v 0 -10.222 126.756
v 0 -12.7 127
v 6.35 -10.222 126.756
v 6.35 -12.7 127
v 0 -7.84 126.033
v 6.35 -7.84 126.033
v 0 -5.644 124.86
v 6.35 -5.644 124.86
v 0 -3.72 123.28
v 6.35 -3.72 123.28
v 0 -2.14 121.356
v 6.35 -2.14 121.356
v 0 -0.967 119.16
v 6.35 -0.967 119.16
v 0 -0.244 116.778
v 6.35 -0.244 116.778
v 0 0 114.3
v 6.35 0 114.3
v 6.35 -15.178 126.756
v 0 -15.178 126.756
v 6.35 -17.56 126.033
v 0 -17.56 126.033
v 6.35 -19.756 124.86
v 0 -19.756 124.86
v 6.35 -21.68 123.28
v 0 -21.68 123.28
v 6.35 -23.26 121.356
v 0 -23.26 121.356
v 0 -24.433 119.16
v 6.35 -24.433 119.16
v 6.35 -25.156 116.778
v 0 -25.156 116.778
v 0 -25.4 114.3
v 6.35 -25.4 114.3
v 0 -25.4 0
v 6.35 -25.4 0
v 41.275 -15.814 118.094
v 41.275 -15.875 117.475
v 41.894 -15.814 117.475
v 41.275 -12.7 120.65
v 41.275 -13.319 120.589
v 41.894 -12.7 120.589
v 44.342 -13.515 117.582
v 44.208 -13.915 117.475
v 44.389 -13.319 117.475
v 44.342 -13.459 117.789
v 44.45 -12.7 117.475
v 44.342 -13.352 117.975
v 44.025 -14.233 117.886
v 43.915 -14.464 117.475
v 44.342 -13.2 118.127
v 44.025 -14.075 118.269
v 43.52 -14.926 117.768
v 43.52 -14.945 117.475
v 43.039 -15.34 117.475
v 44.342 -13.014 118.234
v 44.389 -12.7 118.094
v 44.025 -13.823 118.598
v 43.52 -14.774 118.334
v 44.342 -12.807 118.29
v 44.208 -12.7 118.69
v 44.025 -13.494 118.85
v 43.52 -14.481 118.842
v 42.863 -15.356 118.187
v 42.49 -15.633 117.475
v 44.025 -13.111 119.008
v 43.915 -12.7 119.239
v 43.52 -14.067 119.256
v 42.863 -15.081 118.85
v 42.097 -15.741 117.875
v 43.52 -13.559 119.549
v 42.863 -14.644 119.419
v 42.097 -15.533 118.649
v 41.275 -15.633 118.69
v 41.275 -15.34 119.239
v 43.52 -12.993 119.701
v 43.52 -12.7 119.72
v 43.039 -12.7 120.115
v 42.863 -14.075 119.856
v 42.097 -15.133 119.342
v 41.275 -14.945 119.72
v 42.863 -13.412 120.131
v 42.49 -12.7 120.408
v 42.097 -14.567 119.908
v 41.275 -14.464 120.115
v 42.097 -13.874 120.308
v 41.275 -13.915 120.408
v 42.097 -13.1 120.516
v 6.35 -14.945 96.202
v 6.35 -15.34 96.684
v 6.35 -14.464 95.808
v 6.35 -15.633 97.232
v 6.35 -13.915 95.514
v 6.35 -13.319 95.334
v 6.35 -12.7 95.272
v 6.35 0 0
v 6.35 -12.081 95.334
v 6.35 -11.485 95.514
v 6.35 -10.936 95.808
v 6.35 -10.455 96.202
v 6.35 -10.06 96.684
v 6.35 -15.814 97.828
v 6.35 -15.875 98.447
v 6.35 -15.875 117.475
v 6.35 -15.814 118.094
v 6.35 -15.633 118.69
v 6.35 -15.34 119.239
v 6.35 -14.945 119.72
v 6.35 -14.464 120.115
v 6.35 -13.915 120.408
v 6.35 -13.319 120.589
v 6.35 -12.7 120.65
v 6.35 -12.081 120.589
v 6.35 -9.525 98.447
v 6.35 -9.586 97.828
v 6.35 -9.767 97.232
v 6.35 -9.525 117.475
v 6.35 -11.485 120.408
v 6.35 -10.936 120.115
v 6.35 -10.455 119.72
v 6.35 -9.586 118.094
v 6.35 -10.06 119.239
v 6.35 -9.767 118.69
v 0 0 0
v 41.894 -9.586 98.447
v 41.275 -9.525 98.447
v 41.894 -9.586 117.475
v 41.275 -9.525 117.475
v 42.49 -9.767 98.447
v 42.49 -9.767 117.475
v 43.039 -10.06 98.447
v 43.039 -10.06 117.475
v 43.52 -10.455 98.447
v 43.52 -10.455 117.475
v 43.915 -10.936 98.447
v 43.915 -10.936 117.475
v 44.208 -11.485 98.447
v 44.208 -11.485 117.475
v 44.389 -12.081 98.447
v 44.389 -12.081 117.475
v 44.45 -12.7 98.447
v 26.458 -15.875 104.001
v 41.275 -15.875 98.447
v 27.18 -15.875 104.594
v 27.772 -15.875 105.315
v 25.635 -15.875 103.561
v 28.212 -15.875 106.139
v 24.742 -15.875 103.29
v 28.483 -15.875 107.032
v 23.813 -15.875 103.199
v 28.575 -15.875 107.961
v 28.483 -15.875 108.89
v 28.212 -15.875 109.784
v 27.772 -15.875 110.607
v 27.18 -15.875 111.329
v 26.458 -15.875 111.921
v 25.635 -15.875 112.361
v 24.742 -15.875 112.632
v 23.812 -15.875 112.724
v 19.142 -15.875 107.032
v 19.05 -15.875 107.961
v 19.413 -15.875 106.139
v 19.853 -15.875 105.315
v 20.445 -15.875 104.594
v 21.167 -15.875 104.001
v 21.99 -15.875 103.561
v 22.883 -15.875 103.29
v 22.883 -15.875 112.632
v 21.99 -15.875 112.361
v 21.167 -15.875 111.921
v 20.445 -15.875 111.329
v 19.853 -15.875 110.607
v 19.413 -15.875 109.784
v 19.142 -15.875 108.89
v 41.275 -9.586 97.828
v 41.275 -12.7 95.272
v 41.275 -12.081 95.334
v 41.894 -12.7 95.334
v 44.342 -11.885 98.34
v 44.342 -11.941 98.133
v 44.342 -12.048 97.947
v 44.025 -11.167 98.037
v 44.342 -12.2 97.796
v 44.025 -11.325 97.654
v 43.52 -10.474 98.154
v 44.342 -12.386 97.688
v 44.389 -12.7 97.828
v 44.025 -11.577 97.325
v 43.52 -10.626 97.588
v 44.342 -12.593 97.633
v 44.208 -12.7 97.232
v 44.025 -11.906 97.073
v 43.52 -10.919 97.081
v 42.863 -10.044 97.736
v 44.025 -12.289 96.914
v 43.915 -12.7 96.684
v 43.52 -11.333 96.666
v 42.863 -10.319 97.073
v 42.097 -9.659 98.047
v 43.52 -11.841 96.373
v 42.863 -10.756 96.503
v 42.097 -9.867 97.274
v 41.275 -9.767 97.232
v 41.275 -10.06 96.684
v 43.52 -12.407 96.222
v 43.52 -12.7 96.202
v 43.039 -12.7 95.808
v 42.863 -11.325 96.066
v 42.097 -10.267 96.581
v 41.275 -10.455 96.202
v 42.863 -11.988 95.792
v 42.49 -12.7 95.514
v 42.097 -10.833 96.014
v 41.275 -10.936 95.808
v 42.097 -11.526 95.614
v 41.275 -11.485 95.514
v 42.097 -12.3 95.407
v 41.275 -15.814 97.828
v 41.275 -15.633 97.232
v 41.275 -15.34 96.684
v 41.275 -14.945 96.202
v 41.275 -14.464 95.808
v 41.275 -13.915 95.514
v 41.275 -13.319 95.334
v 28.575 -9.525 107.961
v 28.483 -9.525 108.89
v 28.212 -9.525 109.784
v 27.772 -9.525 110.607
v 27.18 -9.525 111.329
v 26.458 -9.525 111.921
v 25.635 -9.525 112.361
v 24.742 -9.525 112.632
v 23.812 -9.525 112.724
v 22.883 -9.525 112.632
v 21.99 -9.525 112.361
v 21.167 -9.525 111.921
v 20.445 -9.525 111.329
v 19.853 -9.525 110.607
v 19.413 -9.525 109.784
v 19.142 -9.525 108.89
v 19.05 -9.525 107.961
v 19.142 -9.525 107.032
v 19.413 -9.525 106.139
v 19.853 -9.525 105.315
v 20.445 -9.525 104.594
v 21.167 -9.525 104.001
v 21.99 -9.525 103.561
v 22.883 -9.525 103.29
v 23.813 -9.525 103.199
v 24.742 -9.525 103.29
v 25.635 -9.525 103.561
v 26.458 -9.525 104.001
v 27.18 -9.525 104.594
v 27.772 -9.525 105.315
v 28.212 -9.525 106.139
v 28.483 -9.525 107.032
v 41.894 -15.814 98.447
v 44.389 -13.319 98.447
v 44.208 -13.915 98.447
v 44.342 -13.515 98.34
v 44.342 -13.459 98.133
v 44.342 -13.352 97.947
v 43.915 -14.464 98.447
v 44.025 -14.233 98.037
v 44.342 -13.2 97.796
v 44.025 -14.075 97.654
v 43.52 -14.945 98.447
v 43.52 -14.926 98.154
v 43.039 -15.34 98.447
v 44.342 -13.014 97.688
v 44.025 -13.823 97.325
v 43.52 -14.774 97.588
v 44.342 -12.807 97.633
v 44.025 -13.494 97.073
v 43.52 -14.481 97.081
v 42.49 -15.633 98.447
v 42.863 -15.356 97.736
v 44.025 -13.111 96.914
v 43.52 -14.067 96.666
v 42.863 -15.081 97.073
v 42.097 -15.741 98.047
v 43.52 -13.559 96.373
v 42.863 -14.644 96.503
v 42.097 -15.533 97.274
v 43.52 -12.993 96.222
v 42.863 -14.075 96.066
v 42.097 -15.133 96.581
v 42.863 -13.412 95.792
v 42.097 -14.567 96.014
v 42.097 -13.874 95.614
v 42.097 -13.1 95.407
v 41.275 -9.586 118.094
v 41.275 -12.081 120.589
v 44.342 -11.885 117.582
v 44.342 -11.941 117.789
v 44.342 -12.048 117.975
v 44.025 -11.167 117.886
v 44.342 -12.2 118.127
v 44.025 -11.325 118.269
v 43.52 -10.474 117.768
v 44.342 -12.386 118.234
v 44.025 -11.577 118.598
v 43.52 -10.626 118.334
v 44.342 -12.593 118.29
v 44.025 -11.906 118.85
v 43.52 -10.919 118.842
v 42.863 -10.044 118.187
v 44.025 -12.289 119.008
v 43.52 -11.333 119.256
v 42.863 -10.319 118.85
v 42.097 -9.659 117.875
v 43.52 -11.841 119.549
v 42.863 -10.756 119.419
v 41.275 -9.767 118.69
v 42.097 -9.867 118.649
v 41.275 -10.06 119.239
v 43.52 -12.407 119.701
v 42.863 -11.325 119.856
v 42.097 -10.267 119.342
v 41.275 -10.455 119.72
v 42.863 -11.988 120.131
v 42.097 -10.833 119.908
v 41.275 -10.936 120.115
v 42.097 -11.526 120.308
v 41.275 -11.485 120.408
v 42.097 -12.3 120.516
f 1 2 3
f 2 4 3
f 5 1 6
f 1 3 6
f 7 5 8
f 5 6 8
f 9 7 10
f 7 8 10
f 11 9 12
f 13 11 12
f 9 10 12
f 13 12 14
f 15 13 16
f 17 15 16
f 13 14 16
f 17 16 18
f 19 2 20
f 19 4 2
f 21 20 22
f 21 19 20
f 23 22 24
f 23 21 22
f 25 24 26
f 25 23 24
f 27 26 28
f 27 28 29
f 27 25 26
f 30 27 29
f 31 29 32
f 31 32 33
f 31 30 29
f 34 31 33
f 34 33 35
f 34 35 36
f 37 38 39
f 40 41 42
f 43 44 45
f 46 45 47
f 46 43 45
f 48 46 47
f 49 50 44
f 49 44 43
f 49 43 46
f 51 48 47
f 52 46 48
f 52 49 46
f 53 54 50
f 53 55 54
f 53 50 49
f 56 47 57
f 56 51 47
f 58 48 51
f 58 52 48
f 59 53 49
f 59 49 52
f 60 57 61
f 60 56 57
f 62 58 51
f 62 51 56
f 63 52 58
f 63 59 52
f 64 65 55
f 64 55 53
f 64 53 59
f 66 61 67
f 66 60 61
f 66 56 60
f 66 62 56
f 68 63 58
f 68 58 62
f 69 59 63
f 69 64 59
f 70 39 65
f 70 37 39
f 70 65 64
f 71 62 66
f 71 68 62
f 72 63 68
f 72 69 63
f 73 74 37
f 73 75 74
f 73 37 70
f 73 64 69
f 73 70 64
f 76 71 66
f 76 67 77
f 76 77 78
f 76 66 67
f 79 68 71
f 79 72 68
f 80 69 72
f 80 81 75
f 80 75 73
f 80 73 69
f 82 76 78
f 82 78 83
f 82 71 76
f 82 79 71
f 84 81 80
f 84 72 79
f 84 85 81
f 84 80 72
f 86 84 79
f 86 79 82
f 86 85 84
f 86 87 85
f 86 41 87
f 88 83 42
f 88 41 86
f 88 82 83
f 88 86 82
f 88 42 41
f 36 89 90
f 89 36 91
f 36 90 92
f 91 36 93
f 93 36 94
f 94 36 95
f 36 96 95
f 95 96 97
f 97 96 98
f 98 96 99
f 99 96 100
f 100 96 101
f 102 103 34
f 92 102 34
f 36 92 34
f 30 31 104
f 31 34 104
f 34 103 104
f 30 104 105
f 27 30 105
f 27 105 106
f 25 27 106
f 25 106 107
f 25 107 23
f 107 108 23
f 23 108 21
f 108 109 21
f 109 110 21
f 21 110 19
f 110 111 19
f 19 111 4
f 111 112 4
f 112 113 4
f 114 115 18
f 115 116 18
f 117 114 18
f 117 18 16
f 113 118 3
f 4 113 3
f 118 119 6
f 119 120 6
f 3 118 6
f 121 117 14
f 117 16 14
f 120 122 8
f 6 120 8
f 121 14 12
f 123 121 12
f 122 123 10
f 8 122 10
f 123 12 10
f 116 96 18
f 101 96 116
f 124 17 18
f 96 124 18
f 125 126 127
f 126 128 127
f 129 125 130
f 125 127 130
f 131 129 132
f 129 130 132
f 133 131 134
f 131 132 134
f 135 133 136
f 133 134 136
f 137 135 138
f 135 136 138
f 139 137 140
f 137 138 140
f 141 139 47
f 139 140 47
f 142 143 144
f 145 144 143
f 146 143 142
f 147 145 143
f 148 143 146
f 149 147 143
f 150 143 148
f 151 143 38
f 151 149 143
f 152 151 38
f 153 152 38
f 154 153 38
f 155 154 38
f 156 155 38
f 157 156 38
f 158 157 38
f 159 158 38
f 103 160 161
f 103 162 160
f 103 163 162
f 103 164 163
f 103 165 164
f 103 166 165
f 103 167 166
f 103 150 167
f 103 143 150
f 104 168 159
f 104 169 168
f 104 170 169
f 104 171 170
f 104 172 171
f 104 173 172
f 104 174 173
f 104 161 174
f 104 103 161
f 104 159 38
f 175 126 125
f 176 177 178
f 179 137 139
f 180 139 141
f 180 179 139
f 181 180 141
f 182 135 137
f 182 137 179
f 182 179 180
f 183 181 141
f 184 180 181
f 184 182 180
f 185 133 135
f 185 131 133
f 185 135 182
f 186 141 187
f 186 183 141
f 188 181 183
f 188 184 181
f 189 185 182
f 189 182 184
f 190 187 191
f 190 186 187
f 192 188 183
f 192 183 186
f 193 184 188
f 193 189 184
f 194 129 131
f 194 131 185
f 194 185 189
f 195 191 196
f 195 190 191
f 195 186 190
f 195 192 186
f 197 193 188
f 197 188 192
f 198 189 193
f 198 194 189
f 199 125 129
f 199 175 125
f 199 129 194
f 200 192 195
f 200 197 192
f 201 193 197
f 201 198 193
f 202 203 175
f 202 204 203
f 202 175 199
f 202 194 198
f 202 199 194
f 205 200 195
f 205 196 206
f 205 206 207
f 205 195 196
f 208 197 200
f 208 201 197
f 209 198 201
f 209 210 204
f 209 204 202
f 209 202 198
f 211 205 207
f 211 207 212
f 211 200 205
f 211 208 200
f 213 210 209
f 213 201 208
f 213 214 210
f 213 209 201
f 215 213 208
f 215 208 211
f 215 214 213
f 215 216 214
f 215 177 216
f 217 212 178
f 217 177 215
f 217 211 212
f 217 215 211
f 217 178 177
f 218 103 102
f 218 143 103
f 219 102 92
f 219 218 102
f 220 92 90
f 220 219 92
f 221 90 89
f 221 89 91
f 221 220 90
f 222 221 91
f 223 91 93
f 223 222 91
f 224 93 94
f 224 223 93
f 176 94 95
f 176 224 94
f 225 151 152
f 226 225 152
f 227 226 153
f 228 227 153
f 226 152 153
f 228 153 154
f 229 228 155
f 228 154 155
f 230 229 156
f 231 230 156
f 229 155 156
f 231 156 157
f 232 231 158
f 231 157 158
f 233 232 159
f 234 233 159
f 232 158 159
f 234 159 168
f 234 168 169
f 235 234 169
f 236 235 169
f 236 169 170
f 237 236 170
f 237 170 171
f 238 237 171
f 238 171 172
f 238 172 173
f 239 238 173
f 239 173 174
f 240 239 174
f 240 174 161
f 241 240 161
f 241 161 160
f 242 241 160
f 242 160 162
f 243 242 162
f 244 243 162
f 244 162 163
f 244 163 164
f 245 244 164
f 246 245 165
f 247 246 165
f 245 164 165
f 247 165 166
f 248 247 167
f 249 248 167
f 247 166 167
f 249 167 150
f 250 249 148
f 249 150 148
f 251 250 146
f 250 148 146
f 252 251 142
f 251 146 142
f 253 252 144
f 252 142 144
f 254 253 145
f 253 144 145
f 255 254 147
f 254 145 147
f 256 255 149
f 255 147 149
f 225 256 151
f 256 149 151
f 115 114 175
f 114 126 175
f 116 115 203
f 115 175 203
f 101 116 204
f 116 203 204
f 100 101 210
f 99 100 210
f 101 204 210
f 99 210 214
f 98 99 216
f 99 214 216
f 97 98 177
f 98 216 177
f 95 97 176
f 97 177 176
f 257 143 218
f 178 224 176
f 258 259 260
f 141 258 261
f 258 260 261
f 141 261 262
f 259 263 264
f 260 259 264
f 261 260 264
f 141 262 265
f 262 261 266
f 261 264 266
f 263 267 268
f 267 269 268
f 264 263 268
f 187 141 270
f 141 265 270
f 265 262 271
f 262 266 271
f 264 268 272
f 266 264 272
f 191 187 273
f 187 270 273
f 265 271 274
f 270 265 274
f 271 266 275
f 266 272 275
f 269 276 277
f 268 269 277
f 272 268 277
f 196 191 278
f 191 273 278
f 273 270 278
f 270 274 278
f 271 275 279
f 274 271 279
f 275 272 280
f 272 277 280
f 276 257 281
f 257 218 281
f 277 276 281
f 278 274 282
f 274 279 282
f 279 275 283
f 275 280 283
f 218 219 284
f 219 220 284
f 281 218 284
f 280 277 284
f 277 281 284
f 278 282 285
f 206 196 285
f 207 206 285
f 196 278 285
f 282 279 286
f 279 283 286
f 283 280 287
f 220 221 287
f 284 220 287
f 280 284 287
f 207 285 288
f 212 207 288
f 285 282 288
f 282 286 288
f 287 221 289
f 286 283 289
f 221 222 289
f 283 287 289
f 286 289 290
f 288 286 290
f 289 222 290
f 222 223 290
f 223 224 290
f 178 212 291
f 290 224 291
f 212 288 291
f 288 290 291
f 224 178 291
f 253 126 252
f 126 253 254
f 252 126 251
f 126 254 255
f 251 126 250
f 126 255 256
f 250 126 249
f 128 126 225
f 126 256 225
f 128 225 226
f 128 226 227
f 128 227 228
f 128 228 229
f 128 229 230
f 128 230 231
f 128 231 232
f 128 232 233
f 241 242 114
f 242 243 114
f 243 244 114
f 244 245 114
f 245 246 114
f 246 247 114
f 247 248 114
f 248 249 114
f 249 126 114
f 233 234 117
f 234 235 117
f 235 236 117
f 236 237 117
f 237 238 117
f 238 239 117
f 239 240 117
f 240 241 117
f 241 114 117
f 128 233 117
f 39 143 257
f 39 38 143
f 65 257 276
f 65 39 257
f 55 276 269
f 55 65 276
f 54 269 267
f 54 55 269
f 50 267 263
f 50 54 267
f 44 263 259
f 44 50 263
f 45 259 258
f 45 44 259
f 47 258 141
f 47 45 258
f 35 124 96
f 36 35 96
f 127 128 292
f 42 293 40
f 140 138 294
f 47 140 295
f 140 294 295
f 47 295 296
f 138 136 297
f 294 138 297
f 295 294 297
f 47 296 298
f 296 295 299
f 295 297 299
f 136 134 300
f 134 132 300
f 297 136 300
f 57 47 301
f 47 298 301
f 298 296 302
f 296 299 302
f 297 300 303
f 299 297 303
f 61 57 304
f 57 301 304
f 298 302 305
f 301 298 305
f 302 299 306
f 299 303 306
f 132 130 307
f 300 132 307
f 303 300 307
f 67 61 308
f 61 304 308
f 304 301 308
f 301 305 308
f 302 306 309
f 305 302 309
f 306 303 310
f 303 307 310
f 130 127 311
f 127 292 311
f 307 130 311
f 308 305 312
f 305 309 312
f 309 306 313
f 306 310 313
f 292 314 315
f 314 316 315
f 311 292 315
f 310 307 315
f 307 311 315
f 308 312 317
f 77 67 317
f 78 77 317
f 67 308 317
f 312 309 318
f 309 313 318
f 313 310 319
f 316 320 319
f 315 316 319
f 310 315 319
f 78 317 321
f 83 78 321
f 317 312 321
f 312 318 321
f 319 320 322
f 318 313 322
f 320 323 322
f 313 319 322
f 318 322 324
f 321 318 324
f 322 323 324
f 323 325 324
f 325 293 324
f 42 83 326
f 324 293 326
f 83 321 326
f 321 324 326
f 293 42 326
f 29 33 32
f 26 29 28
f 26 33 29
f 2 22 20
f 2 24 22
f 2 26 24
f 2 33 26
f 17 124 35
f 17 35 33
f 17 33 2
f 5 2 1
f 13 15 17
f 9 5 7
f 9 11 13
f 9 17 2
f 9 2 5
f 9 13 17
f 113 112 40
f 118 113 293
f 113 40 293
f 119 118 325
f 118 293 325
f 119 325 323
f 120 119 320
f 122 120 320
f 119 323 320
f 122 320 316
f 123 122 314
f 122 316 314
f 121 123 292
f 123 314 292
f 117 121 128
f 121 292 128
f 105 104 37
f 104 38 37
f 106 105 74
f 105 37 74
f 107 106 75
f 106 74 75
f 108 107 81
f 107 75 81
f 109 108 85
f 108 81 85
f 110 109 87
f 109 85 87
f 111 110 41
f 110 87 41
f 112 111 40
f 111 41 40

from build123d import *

# Parameters (mm, degrees)
F0_W     = 6.35
F0_H     = 127
F1_DEPTH = 25.4
F2_R     = 12.69999
F3_W     = 6.35
F3_H     = 25.3775035135
F4_DEPTH = 38.1
F5_R     = 3.17499
F6_R     = 4.7625
F7_DEPTH = 25.4


# Not quite as in the source:
# - a fillet or chamfer is up to 0.001 mm smaller than in the source, because OpenCascade refuses the exact size


with BuildPart() as f1:
    # F0 (on Front) → F1 (new body)
    with BuildSketch(Plane.XZ):
        with Locations((3.175, 63.5)):
            Rectangle(F0_W, F0_H)
    extrude(amount=F1_DEPTH)

    # F2 (radius 12.7 in the source; OpenCascade refuses exactly that, so slightly less here)
    f2_edges = [f1.edges().sort_by_distance(p)[0] for p in [
        (3.175, -25.4, 127),
        (3.175, 0, 127),
    ]]
    fillet(f2_edges, radius=F2_R)

    # F3 (on face) → F4 (join)
    with BuildSketch(Plane.YZ.offset(6.35)):
        with Locations((-12.7, 107.9612482432)):
            Rectangle(F3_W, F3_H)
    extrude(amount=F4_DEPTH)

    # F5 (radius 3.175 in the source; OpenCascade refuses exactly that, so slightly less here)
    f5_edges = [f1.edges().sort_by_distance(p)[0] for p in [
        (25.4, -15.875, 120.65),
        (25.4, -9.525, 120.65),
        (25.4, -15.875, 95.272496),
        (25.4, -9.525, 95.272496),
        (44.45, -15.875, 107.961248),
        (44.45, -9.525, 107.961248),
        (44.45, -12.7, 95.272496),
        (44.45, -12.7, 120.65),
    ]]
    fillet(f5_edges, radius=F5_R)

    # F6 (on face) → F7 (cut)
    with BuildSketch(Plane.XZ.offset(15.875)):
        with Locations((23.8125, 107.9612482432)):
            Circle(F6_R)
    extrude(amount=-F7_DEPTH, mode=Mode.SUBTRACT)


solid = f1.part
